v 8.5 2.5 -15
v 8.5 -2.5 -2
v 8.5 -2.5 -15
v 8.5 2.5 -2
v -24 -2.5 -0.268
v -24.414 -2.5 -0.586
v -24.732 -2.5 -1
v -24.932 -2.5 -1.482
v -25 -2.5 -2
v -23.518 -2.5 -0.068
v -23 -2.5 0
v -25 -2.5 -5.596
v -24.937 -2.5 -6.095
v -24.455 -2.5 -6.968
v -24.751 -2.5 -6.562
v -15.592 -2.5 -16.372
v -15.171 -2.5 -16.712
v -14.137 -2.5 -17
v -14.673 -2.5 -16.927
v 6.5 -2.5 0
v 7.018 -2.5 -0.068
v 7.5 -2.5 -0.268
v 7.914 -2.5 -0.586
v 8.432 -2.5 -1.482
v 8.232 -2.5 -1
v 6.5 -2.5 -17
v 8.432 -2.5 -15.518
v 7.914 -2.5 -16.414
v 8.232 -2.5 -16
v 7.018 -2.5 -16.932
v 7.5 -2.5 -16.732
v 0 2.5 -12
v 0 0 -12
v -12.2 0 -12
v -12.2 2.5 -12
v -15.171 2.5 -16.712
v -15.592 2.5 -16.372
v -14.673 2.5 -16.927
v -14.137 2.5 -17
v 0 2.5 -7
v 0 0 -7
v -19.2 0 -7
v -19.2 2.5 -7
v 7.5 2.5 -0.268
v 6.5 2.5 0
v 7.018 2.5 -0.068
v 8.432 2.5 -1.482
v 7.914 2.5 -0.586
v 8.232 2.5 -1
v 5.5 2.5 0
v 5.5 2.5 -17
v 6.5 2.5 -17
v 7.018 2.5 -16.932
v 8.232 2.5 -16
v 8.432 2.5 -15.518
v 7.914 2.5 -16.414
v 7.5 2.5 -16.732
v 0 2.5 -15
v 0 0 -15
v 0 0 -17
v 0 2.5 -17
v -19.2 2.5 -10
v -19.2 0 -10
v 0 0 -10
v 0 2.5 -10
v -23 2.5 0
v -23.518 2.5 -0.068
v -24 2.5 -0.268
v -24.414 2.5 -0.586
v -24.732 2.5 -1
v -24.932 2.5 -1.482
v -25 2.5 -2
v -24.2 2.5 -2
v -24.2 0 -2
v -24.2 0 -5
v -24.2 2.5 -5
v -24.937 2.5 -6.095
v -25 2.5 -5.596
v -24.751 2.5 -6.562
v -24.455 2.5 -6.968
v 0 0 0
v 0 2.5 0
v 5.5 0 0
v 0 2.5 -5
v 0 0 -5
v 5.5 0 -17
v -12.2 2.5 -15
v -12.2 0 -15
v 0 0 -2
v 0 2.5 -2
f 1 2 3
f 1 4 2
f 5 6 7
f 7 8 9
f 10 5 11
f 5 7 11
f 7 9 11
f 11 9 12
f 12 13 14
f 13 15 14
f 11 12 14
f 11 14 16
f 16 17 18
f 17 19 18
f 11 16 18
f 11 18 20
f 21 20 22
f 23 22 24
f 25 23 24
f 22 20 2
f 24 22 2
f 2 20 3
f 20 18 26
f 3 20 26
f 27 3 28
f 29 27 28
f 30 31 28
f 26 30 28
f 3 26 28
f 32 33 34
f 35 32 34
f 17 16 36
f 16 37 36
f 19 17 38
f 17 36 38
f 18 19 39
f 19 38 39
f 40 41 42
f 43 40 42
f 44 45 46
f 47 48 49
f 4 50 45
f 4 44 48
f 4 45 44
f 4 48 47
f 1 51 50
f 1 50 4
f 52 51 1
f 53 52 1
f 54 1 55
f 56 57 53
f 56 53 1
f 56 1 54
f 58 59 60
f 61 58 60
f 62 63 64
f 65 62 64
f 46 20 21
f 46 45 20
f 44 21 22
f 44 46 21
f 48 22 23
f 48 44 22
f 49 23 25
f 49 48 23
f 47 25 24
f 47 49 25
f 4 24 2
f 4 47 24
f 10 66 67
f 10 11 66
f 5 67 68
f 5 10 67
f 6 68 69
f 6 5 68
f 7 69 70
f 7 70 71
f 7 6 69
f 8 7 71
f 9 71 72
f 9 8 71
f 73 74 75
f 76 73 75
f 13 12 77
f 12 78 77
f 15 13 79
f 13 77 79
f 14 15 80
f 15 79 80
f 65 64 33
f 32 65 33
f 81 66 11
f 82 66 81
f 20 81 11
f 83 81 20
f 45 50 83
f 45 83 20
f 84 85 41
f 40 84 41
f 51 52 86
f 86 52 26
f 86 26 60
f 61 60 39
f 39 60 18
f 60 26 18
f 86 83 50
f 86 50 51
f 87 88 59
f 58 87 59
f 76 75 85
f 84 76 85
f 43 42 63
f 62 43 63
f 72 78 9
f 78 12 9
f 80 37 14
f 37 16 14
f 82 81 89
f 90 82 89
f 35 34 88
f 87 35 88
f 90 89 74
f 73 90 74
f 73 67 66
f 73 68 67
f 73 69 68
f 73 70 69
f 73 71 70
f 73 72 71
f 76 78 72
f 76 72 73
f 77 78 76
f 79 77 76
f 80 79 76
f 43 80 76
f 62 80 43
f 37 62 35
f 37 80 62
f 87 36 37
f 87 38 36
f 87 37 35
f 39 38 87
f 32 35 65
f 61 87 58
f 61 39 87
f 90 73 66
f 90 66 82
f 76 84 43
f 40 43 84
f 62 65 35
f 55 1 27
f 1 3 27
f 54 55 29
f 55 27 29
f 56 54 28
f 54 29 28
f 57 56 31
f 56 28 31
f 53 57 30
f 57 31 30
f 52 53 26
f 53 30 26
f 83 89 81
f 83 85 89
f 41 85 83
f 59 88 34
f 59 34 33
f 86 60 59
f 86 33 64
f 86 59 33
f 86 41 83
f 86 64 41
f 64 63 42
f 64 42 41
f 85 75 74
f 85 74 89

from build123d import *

# Parameters (mm, degrees)
EXTRUDE_1_DEPTH = 2.5
SKETCH_1_3_W    = 3
SKETCH_1_3_H    = 17
EXTRUDE_2_DEPTH = 2.5
FILLET_1_R      = 2


with BuildPart() as part:
    # Эскиз1 → Бобышка-Вытянуть1 (new body)
    with BuildSketch(Plane(origin=(0, 0, 0), x_dir=(1, 0, 0), z_dir=(0, 1, 0))):
        Polygon((-25, 0), (8.5, 0), (8.5, 17), (-15, 17), (-25, 6.390453713), align=None)
    extrude(amount=-EXTRUDE_1_DEPTH)

    # Эскиз1<3> → Бобышка-Вытянуть2 (add)
    with BuildSketch(Plane(origin=(0, 0, 0), x_dir=(1, 0, 0), z_dir=(0, 1, 0))):
        Polygon((0, 15), (0, 17), (-15, 17), (-25, 6.390453713), (-25, 0), (0, 0), (0, 2), (-24.2, 2), (-24.2, 5), (0, 5), (0, 7), (-19.2, 7), (-19.2, 10), (0, 10), (0, 12), (-12.2, 12), (-12.2, 15), align=None)
        with Locations((7, 8.5)):
            Rectangle(SKETCH_1_3_W, SKETCH_1_3_H)
    extrude(amount=EXTRUDE_2_DEPTH)

    # Скругление1
    fillet_1_edges = [part.edges().sort_by_distance(p)[0] for p in [
        (8.5, 0, 0),
        (8.5, 0, -17),
        (-25, 0, 0),
        (-15, 0, -17),
        (-25, 0, -6.390453713),
    ]]
    fillet(fillet_1_edges, radius=FILLET_1_R)


solid = part.part
